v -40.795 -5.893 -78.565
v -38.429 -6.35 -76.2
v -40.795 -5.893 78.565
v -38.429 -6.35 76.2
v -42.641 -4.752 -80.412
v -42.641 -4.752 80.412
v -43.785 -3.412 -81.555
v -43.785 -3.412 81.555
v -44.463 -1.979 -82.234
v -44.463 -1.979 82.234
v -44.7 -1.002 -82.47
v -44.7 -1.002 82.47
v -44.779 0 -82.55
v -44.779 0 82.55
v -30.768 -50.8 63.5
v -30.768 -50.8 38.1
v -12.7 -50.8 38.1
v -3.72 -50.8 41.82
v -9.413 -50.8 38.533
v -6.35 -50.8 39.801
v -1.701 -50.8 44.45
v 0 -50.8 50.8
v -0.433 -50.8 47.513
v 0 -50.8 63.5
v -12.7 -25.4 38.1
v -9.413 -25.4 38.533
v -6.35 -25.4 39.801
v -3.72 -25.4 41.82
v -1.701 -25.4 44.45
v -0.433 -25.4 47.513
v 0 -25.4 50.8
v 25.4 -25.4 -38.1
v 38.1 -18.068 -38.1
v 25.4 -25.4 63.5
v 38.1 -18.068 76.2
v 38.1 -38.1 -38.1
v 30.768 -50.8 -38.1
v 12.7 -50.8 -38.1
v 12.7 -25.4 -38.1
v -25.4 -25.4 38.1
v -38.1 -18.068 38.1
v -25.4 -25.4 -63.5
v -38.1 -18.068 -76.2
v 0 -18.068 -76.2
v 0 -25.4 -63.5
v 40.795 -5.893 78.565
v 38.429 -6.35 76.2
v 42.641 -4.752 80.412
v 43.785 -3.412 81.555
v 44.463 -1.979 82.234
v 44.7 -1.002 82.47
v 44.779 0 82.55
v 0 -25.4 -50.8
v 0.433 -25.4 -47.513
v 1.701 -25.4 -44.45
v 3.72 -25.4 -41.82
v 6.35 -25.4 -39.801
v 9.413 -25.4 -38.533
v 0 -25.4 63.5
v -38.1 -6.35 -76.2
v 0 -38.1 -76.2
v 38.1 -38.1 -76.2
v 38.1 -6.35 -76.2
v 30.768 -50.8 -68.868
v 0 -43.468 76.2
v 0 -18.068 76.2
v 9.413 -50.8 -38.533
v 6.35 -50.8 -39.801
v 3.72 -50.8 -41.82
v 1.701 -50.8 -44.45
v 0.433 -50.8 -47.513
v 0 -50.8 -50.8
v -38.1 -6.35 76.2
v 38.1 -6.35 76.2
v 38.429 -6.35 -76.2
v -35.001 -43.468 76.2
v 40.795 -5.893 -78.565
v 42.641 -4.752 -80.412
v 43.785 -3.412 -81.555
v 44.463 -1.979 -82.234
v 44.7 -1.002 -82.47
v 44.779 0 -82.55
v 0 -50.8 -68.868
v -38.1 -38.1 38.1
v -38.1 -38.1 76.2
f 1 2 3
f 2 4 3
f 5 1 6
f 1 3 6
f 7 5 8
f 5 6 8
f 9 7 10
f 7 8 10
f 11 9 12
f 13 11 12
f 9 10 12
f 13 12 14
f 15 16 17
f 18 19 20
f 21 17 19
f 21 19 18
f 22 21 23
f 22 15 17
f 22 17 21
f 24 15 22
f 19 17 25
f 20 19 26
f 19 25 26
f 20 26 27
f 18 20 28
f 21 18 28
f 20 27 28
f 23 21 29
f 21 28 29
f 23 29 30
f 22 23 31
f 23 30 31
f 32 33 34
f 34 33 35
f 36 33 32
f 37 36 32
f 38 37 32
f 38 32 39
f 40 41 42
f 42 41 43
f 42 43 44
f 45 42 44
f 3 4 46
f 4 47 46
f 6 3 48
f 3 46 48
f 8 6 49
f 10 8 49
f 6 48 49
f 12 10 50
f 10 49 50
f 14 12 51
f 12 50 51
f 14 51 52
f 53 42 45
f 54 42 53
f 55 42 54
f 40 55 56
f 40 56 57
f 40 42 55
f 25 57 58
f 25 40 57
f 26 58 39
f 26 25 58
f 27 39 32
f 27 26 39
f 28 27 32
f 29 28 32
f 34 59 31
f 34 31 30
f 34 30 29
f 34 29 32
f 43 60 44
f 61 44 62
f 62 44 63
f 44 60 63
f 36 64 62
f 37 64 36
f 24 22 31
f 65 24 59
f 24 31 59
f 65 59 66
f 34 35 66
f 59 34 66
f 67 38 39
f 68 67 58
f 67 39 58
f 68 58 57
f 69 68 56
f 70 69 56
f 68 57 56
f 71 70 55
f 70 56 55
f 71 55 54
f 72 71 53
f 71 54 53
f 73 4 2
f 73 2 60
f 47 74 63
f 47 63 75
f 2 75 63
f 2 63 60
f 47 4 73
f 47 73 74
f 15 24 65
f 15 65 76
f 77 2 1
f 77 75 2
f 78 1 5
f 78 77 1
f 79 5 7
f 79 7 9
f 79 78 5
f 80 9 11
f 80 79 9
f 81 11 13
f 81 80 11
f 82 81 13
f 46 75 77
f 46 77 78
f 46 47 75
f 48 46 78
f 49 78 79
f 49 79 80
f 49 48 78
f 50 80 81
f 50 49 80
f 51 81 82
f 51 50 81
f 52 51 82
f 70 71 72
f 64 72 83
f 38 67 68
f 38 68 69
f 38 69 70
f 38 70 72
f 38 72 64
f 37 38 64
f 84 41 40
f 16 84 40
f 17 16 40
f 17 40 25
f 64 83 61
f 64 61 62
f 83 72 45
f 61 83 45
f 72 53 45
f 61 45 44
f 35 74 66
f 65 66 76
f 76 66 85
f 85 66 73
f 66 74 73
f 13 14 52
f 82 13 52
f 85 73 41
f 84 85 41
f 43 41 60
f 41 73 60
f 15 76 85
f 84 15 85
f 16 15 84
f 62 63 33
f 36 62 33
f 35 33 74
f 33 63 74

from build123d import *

# Parameters (mm, degrees)
F0_W        = 89.5588581535
F0_H        = 165.1
F1_DEPTH    = 6.35
F2_DEPTH    = 25.4
F3_DEPTH    = 50.8
F4_R        = 6.34999
F5_SIZE2    = 7.3323484187
F5_SIZE     = 12.7
F6_C1_SIZE2 = 7.3323484187
F6_C1_SIZE  = 12.7
F6_C2_SIZE2 = 7.3323484187
F6_C2_SIZE  = 12.7
F6_C3_SIZE2 = 12.7
F6_C3_SIZE  = 7.3323484187
F6_C4_SIZE2 = 7.3323484187
F6_C4_SIZE  = 12.7


# Not quite as in the source:
# - a fillet or chamfer is up to 0.001 mm smaller than in the source, because OpenCascade refuses the exact size


with BuildPart() as f1:
    # F0 (on Front) → F1 (new body)
    with BuildSketch(Plane.XZ):
        Rectangle(F0_W, F0_H)
        Polygon((-38.1, 38.1), (-38.1, 76.2), (0, 76.2), (38.1, 76.2), (38.1, -38.1), (38.1, -76.2), (0, -76.2), (-38.1, -76.2), align=None, mode=Mode.SUBTRACT)
    extrude(amount=F1_DEPTH)

    # F0 (on Front) → F2 (join)
    with BuildSketch(Plane.XZ):
        with BuildLine():
            Line((38.1, 76.2), (0, 76.2))
            Line((0, 76.2), (0, 50.8))
            ThreePointArc((0, 50.8), (-3.7197438789, 41.8197438789), (-12.7, 38.1))
            Line((-12.7, 38.1), (-38.1, 38.1))
            Line((-38.1, 38.1), (-38.1, -76.2))
            Line((-38.1, -76.2), (0, -76.2))
            Line((0, -76.2), (0, -50.8))
            ThreePointArc((0, -50.8), (3.7197438789, -41.8197438789), (12.7, -38.1))
            Line((12.7, -38.1), (38.1, -38.1))
            Line((38.1, -38.1), (38.1, 76.2))
        make_face()
    extrude(amount=F2_DEPTH)

    # F0 (on Front) → F3 (join)
    with BuildSketch(Plane.XZ):
        with BuildLine():
            Line((0, 76.2), (-38.1, 76.2))
            Line((-38.1, 76.2), (-38.1, 38.1))
            Line((-38.1, 38.1), (-12.7, 38.1))
            ThreePointArc((-12.7, 38.1), (-3.7197438789, 41.8197438789), (0, 50.8))
            Line((0, 50.8), (0, 76.2))
        make_face()
        with BuildLine():
            Line((38.1, -76.2), (38.1, -38.1))
            Line((38.1, -38.1), (12.7, -38.1))
            ThreePointArc((12.7, -38.1), (3.7197438789, -41.8197438789), (0, -50.8))
            Line((0, -50.8), (0, -76.2))
            Line((0, -76.2), (38.1, -76.2))
        make_face()
    extrude(amount=F3_DEPTH)

    # F4 (radius 6.35 in the source; OpenCascade refuses exactly that, so slightly less here)
    f4_edges = [f1.edges().sort_by_distance(p)[0] for p in [
        (-44.779429, -6.35, 0),
        (0, -6.35, 82.55),
        (0, -6.35, -82.55),
        (44.779429, -6.35, 0),
    ]]
    fillet(f4_edges, radius=F4_R)

    # F5
    f5_edges = [f1.edges().sort_by_distance(p)[0] for p in [
        (-19.05, -25.4, -76.2),
        (38.1, -25.4, 19.05),
        (-38.1, -25.4, -19.05),
        (19.05, -25.4, 76.2),
    ]]
    f5_side = f1.faces().sort_by_distance((0, -25.4, 0))[0]
    chamfer(f5_edges, length=F5_SIZE, length2=F5_SIZE2, reference=f5_side)

    # F6: chamfer of 12.7 x 7.3323484187 on 4 edges, made by hand

    # F6_c1
    f6_c1_edges = [f1.edges().sort_by_distance(p)[0] for p in [
        (-38.1, -50.8, 57.15),
    ]]
    f6_c1_side = f1.faces().sort_by_distance((-38.1, -50.6533530316, 57.15))[0]
    chamfer(f6_c1_edges, length=F6_C1_SIZE, length2=F6_C1_SIZE2, reference=f6_c1_side)

    # F6_c2
    f6_c2_edges = [f1.edges().sort_by_distance(p)[0] for p in [
        (19.05, -50.8, -76.2),
    ]]
    f6_c2_side = f1.faces().sort_by_distance((19.05, -50.6533530316, -76.2))[0]
    chamfer(f6_c2_edges, length=F6_C2_SIZE, length2=F6_C2_SIZE2, reference=f6_c2_side)

    # F6_c3
    f6_c3_edges = [f1.edges().sort_by_distance(p)[0] for p in [
        (-15.3838257906, -50.8, 76.2),
    ]]
    f6_c3_side = f1.faces().sort_by_distance((-15.3838257906, -50.6533530316, 76.2))[0]
    chamfer(f6_c3_edges, length=F6_C3_SIZE, length2=F6_C3_SIZE2, reference=f6_c3_side)

    # F6_c4
    f6_c4_edges = [f1.edges().sort_by_distance(p)[0] for p in [
        (38.1, -50.8, -53.4838257906),
    ]]
    f6_c4_side = f1.faces().sort_by_distance((38.1, -50.6533530316, -53.4838257906))[0]
    chamfer(f6_c4_edges, length=F6_C4_SIZE, length2=F6_C4_SIZE2, reference=f6_c4_side)


solid = f1.part
